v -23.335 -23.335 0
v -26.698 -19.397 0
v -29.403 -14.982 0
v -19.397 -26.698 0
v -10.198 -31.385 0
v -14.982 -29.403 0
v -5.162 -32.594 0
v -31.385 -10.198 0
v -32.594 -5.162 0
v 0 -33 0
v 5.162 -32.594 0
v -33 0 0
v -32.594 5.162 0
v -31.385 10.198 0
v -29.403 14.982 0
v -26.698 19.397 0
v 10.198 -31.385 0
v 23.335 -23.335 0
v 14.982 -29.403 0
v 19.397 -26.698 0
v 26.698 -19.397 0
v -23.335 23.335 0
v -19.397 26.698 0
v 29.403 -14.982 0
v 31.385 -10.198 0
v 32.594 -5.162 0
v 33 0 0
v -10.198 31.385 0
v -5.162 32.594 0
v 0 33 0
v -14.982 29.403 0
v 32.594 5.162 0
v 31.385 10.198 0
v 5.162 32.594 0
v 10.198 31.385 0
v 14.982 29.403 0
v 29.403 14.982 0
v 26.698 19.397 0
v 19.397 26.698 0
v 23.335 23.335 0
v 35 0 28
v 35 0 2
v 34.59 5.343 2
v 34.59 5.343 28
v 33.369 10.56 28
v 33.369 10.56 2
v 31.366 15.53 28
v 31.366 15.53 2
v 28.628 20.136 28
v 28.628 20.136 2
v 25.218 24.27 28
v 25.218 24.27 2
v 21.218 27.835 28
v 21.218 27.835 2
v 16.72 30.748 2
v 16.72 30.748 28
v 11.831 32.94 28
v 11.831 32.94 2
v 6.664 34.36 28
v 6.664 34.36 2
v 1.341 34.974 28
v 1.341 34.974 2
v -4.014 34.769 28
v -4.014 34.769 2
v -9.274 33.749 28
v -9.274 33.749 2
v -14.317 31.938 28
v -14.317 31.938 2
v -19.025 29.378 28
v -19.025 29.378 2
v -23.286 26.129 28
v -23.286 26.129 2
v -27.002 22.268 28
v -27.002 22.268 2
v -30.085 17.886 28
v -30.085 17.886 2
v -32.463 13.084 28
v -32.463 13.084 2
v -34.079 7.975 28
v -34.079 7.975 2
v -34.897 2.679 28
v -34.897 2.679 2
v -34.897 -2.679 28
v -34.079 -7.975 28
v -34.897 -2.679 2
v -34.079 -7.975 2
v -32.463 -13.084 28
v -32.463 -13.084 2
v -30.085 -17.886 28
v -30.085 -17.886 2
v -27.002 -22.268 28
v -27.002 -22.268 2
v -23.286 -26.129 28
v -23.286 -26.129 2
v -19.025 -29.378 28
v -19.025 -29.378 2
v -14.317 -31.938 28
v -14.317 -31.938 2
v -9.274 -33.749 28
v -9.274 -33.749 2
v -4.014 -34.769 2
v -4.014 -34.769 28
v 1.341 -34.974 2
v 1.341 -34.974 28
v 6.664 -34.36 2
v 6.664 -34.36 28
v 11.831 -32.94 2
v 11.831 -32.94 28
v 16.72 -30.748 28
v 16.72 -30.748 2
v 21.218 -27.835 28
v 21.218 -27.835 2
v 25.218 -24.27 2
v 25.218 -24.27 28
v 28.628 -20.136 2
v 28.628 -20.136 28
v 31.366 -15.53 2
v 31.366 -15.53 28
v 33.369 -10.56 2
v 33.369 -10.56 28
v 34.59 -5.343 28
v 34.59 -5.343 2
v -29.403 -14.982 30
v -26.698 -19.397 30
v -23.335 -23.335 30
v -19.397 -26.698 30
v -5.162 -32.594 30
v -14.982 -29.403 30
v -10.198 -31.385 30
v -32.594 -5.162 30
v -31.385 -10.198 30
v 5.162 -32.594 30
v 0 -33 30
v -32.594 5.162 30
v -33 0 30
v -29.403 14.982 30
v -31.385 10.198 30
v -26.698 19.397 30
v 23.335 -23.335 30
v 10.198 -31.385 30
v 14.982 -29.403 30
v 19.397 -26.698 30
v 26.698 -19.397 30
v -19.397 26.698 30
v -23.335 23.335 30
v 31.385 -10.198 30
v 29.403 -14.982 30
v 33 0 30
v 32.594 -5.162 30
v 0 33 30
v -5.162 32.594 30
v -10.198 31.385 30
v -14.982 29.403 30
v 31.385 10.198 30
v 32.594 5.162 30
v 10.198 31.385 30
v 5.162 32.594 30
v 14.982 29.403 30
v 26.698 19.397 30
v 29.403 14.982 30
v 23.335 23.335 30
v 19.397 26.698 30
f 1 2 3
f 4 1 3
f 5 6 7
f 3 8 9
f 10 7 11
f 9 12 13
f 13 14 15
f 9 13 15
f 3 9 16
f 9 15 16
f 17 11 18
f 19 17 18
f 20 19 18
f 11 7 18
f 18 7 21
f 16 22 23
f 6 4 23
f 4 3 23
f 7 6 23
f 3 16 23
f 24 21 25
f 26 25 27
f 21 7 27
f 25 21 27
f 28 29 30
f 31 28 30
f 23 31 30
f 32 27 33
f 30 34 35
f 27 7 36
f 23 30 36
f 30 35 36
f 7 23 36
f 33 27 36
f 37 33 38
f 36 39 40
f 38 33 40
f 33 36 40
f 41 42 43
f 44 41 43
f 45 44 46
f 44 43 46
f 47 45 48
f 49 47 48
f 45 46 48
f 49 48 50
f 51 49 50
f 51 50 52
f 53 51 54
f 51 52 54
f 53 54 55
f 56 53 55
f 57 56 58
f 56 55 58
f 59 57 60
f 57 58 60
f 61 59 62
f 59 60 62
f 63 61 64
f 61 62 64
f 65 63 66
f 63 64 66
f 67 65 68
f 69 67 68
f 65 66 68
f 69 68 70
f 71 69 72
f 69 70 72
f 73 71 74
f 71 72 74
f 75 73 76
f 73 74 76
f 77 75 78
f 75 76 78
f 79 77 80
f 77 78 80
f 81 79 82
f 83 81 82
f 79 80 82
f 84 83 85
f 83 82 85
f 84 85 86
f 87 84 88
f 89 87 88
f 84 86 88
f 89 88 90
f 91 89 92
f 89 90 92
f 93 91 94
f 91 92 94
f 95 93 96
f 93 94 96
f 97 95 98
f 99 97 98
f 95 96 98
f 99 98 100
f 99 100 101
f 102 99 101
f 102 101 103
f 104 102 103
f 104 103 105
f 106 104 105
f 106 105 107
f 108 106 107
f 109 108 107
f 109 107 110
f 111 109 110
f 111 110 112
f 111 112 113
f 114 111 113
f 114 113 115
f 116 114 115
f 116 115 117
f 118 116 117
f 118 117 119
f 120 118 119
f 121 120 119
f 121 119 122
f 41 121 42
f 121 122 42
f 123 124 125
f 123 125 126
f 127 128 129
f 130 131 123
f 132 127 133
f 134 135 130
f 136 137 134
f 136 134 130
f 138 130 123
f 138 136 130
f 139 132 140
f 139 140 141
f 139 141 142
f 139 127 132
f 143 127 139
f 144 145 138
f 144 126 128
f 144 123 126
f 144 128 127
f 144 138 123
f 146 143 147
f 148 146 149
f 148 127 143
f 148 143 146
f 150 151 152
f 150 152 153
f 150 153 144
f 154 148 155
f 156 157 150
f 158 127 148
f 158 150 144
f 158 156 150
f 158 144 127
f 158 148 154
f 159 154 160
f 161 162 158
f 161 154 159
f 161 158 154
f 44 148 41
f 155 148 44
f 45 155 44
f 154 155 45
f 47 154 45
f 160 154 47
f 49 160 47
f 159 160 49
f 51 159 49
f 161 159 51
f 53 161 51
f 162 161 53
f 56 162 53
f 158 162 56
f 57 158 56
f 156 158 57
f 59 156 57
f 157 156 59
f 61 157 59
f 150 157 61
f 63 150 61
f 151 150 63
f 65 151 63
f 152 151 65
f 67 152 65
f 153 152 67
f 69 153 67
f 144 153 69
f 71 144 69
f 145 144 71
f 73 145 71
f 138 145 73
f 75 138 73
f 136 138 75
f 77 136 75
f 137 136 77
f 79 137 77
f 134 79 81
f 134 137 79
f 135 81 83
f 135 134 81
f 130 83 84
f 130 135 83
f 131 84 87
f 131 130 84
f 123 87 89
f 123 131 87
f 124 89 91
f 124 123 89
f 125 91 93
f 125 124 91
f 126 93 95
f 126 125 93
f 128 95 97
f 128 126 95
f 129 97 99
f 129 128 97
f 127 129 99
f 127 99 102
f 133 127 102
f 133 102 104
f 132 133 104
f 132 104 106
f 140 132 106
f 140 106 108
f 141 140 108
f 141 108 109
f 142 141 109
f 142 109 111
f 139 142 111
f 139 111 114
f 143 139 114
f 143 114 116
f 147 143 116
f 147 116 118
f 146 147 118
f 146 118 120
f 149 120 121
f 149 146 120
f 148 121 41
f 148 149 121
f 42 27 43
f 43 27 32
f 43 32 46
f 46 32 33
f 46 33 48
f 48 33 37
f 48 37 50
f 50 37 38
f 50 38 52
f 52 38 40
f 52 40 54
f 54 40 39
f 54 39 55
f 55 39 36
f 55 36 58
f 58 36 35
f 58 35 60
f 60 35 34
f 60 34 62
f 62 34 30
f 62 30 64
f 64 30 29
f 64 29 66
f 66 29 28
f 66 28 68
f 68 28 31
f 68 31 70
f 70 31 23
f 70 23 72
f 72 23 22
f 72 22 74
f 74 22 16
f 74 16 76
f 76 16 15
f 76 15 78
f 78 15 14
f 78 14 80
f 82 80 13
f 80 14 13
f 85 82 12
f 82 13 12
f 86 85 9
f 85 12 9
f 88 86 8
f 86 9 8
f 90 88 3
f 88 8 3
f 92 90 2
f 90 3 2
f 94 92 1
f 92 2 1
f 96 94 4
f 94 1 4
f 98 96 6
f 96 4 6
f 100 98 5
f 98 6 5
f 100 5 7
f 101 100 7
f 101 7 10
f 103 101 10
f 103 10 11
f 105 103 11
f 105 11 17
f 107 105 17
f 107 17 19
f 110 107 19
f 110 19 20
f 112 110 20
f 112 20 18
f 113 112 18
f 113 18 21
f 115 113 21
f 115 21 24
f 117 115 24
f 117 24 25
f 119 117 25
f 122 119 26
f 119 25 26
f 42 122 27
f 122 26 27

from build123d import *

# Parameters (mm, degrees)
ESQUISSE1_R      = 35
EXTRUSION1_DEPTH = 30
CHANFREIN1_SIZE  = 2
CHANFREIN2_SIZE  = 2


with BuildPart() as part:
    # Esquisse1 → Extrusion1 (new body)
    with BuildSketch(Plane.XY):
        Circle(ESQUISSE1_R)
    extrude(amount=EXTRUSION1_DEPTH)

    # Chanfrein1
    chanfrein1_edges = [part.edges().sort_by_distance(p)[0] for p in [
        (-35, 0, 30),
    ]]
    chamfer(chanfrein1_edges, length=CHANFREIN1_SIZE)

    # Chanfrein2
    chanfrein2_edges = [part.edges().sort_by_distance(p)[0] for p in [
        (-35, 0, 0),
    ]]
    chamfer(chanfrein2_edges, length=CHANFREIN2_SIZE)


solid = part.part
